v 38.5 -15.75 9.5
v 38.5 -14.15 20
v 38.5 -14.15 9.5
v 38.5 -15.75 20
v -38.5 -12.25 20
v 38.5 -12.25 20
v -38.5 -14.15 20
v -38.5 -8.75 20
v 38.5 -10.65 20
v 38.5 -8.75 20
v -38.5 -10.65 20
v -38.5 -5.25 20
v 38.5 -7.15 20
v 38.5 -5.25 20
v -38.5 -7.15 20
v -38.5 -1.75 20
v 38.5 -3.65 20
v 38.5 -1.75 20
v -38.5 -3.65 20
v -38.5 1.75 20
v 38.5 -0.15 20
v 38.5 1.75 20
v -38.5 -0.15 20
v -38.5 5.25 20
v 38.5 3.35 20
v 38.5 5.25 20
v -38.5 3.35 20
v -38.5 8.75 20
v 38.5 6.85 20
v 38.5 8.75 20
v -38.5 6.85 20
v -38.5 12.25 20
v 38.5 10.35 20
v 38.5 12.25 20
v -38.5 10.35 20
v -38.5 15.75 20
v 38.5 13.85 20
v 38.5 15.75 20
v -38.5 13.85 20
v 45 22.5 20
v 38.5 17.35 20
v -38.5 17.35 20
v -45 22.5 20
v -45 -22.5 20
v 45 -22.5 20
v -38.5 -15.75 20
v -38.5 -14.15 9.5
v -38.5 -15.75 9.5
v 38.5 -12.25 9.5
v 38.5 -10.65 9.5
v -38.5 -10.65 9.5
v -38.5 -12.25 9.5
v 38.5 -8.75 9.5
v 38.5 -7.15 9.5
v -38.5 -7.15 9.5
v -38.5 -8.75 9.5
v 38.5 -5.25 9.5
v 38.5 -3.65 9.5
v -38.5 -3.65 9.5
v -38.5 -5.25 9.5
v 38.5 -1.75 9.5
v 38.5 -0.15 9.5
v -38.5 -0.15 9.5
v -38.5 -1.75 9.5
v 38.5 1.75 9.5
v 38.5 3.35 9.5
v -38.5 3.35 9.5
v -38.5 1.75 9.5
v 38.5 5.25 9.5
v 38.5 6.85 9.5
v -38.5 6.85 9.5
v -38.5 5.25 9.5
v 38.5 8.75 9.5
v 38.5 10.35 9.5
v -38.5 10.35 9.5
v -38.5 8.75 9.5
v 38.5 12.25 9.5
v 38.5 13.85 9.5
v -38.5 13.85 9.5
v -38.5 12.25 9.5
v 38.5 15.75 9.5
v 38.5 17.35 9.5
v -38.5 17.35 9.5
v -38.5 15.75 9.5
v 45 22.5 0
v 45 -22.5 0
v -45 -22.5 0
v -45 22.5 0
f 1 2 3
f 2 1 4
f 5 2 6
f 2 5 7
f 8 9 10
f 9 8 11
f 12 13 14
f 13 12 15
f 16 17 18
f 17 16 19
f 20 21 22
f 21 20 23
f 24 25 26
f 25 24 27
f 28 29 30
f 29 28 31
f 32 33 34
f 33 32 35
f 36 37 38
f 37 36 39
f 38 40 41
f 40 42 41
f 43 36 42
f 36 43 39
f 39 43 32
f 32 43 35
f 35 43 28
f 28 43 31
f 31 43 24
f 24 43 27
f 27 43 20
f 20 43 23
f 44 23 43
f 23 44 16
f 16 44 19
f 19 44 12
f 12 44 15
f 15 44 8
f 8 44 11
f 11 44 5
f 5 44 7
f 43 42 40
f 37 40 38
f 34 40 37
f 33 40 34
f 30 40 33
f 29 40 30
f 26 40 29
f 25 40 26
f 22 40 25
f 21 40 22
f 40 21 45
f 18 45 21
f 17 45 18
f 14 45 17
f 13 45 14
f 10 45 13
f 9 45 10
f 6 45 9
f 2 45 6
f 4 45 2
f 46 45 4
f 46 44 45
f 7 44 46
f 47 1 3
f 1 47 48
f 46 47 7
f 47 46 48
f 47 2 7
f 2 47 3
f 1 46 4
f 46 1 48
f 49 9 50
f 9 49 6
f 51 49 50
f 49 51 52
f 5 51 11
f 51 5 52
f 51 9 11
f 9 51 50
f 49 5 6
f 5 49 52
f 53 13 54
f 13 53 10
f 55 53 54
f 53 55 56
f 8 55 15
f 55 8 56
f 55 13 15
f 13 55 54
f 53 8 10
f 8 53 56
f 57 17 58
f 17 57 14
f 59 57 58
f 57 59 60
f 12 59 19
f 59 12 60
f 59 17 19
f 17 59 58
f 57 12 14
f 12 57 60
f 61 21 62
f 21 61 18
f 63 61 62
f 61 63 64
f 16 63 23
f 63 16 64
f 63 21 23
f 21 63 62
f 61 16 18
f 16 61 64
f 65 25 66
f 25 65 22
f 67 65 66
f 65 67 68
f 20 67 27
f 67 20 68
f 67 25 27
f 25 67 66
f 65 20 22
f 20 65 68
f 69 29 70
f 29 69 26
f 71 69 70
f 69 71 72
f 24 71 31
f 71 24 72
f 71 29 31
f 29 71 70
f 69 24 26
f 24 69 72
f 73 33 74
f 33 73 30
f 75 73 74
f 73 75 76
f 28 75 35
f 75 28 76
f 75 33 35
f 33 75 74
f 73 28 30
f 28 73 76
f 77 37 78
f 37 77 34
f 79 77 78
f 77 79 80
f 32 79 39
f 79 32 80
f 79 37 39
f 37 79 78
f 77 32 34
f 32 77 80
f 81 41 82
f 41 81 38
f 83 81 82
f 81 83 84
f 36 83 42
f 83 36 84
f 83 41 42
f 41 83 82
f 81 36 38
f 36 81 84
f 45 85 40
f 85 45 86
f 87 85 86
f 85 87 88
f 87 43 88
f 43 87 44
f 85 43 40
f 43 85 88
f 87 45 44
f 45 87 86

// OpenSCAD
// Drying rack for 10 microscope slides
// Print orientation: base on XY plane, slots open at top (+Z)

$fn = 64;

// ---- Block dimensions ----
block_x = 90;        // block length (X)
block_y = 45;        // block width (Y)
block_z = 20;        // block height (Z)

// ---- Slot dimensions ----
slot_n     = 10;     // number of slots
slot_len   = 77;     // slot length (X)
slot_w     = 1.6;    // slot width (Y)
slot_depth = 10;     // slot depth from top face (Z)

// ---- Layout ----
slot_pitch = 3.5;    // centre-to-centre spacing in Y
group_y    = 0;      // Y position of the slot group (will be centred)

// ---- Cutting overlap ----
eps = 0.5;           // extension past top face to avoid coplanar faces

// Y position of first slot so the group is centred on the block
first_y = group_y - (slot_n - 1) * slot_pitch / 2;

difference() {
    // Solid base block, centred in X and Y, resting on z = 0
    translate([-block_x / 2, -block_y / 2, 0])
        cube([block_x, block_y, block_z]);

    // 10 parallel slots along X, open at top
    for (i = [0 : slot_n - 1])
        translate([-slot_len / 2, first_y + i * slot_pitch, block_z - slot_depth])
            translate([0, 0, -eps])
                cube([slot_len, slot_w, slot_depth + eps]);
}
